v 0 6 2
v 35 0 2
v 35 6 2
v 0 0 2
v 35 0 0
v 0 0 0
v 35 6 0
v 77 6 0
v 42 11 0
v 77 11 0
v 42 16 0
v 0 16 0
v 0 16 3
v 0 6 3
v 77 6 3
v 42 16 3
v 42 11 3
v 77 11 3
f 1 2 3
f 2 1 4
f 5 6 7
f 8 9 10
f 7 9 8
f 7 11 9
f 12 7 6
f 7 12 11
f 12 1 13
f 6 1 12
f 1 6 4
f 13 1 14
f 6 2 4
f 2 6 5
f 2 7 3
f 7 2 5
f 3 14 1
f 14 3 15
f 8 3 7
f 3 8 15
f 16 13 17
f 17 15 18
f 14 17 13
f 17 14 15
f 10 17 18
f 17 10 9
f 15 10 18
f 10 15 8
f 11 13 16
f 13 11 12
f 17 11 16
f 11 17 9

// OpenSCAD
translate([2.5, 1.5, 1.0]) color([0.7484858811975865, 0.8289027709575956, 0.08072310687247075]) cube([5, 3, 2], center=true);
translate([7.5, 1.5, 1.0]) color([0.594576926472109, 0.6985826889753467, 0.16007977902454107]) cube([5, 3, 2], center=true);
translate([12.5, 1.5, 1.0]) color([0.22309782085865282, 0.4481353266436462, 0.7103499760882809]) cube([5, 3, 2], center=true);
translate([17.5, 1.5, 1.0]) color([0.6737752003084974, 0.8745376498580455, 0.03154547812243602]) cube([5, 3, 2], center=true);
translate([22.5, 1.5, 1.0]) color([0.8716881923513831, 0.5674723417924832, 0.7721857179864934]) cube([5, 3, 2], center=true);
translate([27.5, 1.5, 1.0]) color([0.709006034186331, 0.16567497287207977, 0.06388630911131887]) cube([5, 3, 2], center=true);
translate([32.5, 1.5, 1.0]) color([0.7015161675042403, 0.44636471217552665, 0.8849455079977631]) cube([5, 3, 2], center=true);
translate([2.5, 4.5, 1.0]) color([0.9080398571595916, 0.603977387811875, 6.916287448366365e-05]) cube([5, 3, 2], center=true);
translate([7.5, 4.5, 1.0]) color([0.03891018401520452, 0.3259439044599104, 0.8377368410445171]) cube([5, 3, 2], center=true);
translate([12.5, 4.5, 1.0]) color([0.049856996603651726, 0.8227199232206964, 0.9741768822998921]) cube([5, 3, 2], center=true);
translate([17.5, 4.5, 1.0]) color([0.41513741156459816, 0.5485620647625651, 0.9630377712330874]) cube([5, 3, 2], center=true);
translate([22.5, 4.5, 1.0]) color([0.9785717508455145, 0.8374483937438901, 0.13052175184206272]) cube([5, 3, 2], center=true);
translate([27.5, 4.5, 1.0]) color([0.014729286743825787, 0.9495475342759118, 0.4174850755645121]) cube([5, 3, 2], center=true);
translate([32.5, 4.5, 1.0]) color([0.003392809730206836, 0.014291314164728952, 0.7547538206156906]) cube([5, 3, 2], center=true);
translate([3.5, 8.5, 1.5]) color([0.9802446426654712, 0.6757618973280934, 0.6120619632138635]) cube([7, 5, 3], center=true);
translate([10.5, 8.5, 1.5]) color([0.19045993029254593, 0.6083596397136556, 0.19851637537519495]) cube([7, 5, 3], center=true);
translate([17.5, 8.5, 1.5]) color([0.30241604357944973, 0.6885400040337084, 0.1822211451841942]) cube([7, 5, 3], center=true);
translate([24.5, 8.5, 1.5]) color([0.4756054792846598, 0.9227697282783401, 0.6276391005616293]) cube([7, 5, 3], center=true);
translate([31.5, 8.5, 1.5]) color([0.021845499237729826, 0.9138811115397377, 0.7998245566512758]) cube([7, 5, 3], center=true);
translate([38.5, 8.5, 1.5]) color([0.11577939883887689, 0.25648877124056624, 0.6535669902031535]) cube([7, 5, 3], center=true);
translate([45.5, 8.5, 1.5]) color([0.8172732193081321, 0.644940669440128, 0.11510934585231414]) cube([7, 5, 3], center=true);
translate([52.5, 8.5, 1.5]) color([0.15444013683803237, 0.8512397484375114, 0.04229760200279409]) cube([7, 5, 3], center=true);
translate([59.5, 8.5, 1.5]) color([0.20573574066904754, 0.25966938255992333, 0.31471323182063216]) cube([7, 5, 3], center=true);
translate([66.5, 8.5, 1.5]) color([0.3668937976542025, 0.5674677931506273, 0.849437788441811]) cube([7, 5, 3], center=true);
translate([73.5, 8.5, 1.5]) color([0.8463599216128499, 0.9612029098073006, 0.6075964991402765]) cube([7, 5, 3], center=true);
translate([3.5, 13.5, 1.5]) color([0.49448567414550215, 0.6441434540056448, 0.45866436243162445]) cube([7, 5, 3], center=true);
translate([10.5, 13.5, 1.5]) color([0.4354406175944898, 0.8714107315087972, 0.17828831976535986]) cube([7, 5, 3], center=true);
translate([17.5, 13.5, 1.5]) color([0.3755789219373874, 0.2910354883141598, 0.1384569492267308]) cube([7, 5, 3], center=true);
translate([24.5, 13.5, 1.5]) color([0.27137343088841726, 0.3375110685052213, 0.3672014751918571]) cube([7, 5, 3], center=true);
translate([31.5, 13.5, 1.5]) color([0.09370751185905901, 0.7794169159273662, 0.03566546768846324]) cube([7, 5, 3], center=true);
translate([38.5, 13.5, 1.5]) color([0.26962214085355807, 0.14941603676910742, 0.583451176356754]) cube([7, 5, 3], center=true);
